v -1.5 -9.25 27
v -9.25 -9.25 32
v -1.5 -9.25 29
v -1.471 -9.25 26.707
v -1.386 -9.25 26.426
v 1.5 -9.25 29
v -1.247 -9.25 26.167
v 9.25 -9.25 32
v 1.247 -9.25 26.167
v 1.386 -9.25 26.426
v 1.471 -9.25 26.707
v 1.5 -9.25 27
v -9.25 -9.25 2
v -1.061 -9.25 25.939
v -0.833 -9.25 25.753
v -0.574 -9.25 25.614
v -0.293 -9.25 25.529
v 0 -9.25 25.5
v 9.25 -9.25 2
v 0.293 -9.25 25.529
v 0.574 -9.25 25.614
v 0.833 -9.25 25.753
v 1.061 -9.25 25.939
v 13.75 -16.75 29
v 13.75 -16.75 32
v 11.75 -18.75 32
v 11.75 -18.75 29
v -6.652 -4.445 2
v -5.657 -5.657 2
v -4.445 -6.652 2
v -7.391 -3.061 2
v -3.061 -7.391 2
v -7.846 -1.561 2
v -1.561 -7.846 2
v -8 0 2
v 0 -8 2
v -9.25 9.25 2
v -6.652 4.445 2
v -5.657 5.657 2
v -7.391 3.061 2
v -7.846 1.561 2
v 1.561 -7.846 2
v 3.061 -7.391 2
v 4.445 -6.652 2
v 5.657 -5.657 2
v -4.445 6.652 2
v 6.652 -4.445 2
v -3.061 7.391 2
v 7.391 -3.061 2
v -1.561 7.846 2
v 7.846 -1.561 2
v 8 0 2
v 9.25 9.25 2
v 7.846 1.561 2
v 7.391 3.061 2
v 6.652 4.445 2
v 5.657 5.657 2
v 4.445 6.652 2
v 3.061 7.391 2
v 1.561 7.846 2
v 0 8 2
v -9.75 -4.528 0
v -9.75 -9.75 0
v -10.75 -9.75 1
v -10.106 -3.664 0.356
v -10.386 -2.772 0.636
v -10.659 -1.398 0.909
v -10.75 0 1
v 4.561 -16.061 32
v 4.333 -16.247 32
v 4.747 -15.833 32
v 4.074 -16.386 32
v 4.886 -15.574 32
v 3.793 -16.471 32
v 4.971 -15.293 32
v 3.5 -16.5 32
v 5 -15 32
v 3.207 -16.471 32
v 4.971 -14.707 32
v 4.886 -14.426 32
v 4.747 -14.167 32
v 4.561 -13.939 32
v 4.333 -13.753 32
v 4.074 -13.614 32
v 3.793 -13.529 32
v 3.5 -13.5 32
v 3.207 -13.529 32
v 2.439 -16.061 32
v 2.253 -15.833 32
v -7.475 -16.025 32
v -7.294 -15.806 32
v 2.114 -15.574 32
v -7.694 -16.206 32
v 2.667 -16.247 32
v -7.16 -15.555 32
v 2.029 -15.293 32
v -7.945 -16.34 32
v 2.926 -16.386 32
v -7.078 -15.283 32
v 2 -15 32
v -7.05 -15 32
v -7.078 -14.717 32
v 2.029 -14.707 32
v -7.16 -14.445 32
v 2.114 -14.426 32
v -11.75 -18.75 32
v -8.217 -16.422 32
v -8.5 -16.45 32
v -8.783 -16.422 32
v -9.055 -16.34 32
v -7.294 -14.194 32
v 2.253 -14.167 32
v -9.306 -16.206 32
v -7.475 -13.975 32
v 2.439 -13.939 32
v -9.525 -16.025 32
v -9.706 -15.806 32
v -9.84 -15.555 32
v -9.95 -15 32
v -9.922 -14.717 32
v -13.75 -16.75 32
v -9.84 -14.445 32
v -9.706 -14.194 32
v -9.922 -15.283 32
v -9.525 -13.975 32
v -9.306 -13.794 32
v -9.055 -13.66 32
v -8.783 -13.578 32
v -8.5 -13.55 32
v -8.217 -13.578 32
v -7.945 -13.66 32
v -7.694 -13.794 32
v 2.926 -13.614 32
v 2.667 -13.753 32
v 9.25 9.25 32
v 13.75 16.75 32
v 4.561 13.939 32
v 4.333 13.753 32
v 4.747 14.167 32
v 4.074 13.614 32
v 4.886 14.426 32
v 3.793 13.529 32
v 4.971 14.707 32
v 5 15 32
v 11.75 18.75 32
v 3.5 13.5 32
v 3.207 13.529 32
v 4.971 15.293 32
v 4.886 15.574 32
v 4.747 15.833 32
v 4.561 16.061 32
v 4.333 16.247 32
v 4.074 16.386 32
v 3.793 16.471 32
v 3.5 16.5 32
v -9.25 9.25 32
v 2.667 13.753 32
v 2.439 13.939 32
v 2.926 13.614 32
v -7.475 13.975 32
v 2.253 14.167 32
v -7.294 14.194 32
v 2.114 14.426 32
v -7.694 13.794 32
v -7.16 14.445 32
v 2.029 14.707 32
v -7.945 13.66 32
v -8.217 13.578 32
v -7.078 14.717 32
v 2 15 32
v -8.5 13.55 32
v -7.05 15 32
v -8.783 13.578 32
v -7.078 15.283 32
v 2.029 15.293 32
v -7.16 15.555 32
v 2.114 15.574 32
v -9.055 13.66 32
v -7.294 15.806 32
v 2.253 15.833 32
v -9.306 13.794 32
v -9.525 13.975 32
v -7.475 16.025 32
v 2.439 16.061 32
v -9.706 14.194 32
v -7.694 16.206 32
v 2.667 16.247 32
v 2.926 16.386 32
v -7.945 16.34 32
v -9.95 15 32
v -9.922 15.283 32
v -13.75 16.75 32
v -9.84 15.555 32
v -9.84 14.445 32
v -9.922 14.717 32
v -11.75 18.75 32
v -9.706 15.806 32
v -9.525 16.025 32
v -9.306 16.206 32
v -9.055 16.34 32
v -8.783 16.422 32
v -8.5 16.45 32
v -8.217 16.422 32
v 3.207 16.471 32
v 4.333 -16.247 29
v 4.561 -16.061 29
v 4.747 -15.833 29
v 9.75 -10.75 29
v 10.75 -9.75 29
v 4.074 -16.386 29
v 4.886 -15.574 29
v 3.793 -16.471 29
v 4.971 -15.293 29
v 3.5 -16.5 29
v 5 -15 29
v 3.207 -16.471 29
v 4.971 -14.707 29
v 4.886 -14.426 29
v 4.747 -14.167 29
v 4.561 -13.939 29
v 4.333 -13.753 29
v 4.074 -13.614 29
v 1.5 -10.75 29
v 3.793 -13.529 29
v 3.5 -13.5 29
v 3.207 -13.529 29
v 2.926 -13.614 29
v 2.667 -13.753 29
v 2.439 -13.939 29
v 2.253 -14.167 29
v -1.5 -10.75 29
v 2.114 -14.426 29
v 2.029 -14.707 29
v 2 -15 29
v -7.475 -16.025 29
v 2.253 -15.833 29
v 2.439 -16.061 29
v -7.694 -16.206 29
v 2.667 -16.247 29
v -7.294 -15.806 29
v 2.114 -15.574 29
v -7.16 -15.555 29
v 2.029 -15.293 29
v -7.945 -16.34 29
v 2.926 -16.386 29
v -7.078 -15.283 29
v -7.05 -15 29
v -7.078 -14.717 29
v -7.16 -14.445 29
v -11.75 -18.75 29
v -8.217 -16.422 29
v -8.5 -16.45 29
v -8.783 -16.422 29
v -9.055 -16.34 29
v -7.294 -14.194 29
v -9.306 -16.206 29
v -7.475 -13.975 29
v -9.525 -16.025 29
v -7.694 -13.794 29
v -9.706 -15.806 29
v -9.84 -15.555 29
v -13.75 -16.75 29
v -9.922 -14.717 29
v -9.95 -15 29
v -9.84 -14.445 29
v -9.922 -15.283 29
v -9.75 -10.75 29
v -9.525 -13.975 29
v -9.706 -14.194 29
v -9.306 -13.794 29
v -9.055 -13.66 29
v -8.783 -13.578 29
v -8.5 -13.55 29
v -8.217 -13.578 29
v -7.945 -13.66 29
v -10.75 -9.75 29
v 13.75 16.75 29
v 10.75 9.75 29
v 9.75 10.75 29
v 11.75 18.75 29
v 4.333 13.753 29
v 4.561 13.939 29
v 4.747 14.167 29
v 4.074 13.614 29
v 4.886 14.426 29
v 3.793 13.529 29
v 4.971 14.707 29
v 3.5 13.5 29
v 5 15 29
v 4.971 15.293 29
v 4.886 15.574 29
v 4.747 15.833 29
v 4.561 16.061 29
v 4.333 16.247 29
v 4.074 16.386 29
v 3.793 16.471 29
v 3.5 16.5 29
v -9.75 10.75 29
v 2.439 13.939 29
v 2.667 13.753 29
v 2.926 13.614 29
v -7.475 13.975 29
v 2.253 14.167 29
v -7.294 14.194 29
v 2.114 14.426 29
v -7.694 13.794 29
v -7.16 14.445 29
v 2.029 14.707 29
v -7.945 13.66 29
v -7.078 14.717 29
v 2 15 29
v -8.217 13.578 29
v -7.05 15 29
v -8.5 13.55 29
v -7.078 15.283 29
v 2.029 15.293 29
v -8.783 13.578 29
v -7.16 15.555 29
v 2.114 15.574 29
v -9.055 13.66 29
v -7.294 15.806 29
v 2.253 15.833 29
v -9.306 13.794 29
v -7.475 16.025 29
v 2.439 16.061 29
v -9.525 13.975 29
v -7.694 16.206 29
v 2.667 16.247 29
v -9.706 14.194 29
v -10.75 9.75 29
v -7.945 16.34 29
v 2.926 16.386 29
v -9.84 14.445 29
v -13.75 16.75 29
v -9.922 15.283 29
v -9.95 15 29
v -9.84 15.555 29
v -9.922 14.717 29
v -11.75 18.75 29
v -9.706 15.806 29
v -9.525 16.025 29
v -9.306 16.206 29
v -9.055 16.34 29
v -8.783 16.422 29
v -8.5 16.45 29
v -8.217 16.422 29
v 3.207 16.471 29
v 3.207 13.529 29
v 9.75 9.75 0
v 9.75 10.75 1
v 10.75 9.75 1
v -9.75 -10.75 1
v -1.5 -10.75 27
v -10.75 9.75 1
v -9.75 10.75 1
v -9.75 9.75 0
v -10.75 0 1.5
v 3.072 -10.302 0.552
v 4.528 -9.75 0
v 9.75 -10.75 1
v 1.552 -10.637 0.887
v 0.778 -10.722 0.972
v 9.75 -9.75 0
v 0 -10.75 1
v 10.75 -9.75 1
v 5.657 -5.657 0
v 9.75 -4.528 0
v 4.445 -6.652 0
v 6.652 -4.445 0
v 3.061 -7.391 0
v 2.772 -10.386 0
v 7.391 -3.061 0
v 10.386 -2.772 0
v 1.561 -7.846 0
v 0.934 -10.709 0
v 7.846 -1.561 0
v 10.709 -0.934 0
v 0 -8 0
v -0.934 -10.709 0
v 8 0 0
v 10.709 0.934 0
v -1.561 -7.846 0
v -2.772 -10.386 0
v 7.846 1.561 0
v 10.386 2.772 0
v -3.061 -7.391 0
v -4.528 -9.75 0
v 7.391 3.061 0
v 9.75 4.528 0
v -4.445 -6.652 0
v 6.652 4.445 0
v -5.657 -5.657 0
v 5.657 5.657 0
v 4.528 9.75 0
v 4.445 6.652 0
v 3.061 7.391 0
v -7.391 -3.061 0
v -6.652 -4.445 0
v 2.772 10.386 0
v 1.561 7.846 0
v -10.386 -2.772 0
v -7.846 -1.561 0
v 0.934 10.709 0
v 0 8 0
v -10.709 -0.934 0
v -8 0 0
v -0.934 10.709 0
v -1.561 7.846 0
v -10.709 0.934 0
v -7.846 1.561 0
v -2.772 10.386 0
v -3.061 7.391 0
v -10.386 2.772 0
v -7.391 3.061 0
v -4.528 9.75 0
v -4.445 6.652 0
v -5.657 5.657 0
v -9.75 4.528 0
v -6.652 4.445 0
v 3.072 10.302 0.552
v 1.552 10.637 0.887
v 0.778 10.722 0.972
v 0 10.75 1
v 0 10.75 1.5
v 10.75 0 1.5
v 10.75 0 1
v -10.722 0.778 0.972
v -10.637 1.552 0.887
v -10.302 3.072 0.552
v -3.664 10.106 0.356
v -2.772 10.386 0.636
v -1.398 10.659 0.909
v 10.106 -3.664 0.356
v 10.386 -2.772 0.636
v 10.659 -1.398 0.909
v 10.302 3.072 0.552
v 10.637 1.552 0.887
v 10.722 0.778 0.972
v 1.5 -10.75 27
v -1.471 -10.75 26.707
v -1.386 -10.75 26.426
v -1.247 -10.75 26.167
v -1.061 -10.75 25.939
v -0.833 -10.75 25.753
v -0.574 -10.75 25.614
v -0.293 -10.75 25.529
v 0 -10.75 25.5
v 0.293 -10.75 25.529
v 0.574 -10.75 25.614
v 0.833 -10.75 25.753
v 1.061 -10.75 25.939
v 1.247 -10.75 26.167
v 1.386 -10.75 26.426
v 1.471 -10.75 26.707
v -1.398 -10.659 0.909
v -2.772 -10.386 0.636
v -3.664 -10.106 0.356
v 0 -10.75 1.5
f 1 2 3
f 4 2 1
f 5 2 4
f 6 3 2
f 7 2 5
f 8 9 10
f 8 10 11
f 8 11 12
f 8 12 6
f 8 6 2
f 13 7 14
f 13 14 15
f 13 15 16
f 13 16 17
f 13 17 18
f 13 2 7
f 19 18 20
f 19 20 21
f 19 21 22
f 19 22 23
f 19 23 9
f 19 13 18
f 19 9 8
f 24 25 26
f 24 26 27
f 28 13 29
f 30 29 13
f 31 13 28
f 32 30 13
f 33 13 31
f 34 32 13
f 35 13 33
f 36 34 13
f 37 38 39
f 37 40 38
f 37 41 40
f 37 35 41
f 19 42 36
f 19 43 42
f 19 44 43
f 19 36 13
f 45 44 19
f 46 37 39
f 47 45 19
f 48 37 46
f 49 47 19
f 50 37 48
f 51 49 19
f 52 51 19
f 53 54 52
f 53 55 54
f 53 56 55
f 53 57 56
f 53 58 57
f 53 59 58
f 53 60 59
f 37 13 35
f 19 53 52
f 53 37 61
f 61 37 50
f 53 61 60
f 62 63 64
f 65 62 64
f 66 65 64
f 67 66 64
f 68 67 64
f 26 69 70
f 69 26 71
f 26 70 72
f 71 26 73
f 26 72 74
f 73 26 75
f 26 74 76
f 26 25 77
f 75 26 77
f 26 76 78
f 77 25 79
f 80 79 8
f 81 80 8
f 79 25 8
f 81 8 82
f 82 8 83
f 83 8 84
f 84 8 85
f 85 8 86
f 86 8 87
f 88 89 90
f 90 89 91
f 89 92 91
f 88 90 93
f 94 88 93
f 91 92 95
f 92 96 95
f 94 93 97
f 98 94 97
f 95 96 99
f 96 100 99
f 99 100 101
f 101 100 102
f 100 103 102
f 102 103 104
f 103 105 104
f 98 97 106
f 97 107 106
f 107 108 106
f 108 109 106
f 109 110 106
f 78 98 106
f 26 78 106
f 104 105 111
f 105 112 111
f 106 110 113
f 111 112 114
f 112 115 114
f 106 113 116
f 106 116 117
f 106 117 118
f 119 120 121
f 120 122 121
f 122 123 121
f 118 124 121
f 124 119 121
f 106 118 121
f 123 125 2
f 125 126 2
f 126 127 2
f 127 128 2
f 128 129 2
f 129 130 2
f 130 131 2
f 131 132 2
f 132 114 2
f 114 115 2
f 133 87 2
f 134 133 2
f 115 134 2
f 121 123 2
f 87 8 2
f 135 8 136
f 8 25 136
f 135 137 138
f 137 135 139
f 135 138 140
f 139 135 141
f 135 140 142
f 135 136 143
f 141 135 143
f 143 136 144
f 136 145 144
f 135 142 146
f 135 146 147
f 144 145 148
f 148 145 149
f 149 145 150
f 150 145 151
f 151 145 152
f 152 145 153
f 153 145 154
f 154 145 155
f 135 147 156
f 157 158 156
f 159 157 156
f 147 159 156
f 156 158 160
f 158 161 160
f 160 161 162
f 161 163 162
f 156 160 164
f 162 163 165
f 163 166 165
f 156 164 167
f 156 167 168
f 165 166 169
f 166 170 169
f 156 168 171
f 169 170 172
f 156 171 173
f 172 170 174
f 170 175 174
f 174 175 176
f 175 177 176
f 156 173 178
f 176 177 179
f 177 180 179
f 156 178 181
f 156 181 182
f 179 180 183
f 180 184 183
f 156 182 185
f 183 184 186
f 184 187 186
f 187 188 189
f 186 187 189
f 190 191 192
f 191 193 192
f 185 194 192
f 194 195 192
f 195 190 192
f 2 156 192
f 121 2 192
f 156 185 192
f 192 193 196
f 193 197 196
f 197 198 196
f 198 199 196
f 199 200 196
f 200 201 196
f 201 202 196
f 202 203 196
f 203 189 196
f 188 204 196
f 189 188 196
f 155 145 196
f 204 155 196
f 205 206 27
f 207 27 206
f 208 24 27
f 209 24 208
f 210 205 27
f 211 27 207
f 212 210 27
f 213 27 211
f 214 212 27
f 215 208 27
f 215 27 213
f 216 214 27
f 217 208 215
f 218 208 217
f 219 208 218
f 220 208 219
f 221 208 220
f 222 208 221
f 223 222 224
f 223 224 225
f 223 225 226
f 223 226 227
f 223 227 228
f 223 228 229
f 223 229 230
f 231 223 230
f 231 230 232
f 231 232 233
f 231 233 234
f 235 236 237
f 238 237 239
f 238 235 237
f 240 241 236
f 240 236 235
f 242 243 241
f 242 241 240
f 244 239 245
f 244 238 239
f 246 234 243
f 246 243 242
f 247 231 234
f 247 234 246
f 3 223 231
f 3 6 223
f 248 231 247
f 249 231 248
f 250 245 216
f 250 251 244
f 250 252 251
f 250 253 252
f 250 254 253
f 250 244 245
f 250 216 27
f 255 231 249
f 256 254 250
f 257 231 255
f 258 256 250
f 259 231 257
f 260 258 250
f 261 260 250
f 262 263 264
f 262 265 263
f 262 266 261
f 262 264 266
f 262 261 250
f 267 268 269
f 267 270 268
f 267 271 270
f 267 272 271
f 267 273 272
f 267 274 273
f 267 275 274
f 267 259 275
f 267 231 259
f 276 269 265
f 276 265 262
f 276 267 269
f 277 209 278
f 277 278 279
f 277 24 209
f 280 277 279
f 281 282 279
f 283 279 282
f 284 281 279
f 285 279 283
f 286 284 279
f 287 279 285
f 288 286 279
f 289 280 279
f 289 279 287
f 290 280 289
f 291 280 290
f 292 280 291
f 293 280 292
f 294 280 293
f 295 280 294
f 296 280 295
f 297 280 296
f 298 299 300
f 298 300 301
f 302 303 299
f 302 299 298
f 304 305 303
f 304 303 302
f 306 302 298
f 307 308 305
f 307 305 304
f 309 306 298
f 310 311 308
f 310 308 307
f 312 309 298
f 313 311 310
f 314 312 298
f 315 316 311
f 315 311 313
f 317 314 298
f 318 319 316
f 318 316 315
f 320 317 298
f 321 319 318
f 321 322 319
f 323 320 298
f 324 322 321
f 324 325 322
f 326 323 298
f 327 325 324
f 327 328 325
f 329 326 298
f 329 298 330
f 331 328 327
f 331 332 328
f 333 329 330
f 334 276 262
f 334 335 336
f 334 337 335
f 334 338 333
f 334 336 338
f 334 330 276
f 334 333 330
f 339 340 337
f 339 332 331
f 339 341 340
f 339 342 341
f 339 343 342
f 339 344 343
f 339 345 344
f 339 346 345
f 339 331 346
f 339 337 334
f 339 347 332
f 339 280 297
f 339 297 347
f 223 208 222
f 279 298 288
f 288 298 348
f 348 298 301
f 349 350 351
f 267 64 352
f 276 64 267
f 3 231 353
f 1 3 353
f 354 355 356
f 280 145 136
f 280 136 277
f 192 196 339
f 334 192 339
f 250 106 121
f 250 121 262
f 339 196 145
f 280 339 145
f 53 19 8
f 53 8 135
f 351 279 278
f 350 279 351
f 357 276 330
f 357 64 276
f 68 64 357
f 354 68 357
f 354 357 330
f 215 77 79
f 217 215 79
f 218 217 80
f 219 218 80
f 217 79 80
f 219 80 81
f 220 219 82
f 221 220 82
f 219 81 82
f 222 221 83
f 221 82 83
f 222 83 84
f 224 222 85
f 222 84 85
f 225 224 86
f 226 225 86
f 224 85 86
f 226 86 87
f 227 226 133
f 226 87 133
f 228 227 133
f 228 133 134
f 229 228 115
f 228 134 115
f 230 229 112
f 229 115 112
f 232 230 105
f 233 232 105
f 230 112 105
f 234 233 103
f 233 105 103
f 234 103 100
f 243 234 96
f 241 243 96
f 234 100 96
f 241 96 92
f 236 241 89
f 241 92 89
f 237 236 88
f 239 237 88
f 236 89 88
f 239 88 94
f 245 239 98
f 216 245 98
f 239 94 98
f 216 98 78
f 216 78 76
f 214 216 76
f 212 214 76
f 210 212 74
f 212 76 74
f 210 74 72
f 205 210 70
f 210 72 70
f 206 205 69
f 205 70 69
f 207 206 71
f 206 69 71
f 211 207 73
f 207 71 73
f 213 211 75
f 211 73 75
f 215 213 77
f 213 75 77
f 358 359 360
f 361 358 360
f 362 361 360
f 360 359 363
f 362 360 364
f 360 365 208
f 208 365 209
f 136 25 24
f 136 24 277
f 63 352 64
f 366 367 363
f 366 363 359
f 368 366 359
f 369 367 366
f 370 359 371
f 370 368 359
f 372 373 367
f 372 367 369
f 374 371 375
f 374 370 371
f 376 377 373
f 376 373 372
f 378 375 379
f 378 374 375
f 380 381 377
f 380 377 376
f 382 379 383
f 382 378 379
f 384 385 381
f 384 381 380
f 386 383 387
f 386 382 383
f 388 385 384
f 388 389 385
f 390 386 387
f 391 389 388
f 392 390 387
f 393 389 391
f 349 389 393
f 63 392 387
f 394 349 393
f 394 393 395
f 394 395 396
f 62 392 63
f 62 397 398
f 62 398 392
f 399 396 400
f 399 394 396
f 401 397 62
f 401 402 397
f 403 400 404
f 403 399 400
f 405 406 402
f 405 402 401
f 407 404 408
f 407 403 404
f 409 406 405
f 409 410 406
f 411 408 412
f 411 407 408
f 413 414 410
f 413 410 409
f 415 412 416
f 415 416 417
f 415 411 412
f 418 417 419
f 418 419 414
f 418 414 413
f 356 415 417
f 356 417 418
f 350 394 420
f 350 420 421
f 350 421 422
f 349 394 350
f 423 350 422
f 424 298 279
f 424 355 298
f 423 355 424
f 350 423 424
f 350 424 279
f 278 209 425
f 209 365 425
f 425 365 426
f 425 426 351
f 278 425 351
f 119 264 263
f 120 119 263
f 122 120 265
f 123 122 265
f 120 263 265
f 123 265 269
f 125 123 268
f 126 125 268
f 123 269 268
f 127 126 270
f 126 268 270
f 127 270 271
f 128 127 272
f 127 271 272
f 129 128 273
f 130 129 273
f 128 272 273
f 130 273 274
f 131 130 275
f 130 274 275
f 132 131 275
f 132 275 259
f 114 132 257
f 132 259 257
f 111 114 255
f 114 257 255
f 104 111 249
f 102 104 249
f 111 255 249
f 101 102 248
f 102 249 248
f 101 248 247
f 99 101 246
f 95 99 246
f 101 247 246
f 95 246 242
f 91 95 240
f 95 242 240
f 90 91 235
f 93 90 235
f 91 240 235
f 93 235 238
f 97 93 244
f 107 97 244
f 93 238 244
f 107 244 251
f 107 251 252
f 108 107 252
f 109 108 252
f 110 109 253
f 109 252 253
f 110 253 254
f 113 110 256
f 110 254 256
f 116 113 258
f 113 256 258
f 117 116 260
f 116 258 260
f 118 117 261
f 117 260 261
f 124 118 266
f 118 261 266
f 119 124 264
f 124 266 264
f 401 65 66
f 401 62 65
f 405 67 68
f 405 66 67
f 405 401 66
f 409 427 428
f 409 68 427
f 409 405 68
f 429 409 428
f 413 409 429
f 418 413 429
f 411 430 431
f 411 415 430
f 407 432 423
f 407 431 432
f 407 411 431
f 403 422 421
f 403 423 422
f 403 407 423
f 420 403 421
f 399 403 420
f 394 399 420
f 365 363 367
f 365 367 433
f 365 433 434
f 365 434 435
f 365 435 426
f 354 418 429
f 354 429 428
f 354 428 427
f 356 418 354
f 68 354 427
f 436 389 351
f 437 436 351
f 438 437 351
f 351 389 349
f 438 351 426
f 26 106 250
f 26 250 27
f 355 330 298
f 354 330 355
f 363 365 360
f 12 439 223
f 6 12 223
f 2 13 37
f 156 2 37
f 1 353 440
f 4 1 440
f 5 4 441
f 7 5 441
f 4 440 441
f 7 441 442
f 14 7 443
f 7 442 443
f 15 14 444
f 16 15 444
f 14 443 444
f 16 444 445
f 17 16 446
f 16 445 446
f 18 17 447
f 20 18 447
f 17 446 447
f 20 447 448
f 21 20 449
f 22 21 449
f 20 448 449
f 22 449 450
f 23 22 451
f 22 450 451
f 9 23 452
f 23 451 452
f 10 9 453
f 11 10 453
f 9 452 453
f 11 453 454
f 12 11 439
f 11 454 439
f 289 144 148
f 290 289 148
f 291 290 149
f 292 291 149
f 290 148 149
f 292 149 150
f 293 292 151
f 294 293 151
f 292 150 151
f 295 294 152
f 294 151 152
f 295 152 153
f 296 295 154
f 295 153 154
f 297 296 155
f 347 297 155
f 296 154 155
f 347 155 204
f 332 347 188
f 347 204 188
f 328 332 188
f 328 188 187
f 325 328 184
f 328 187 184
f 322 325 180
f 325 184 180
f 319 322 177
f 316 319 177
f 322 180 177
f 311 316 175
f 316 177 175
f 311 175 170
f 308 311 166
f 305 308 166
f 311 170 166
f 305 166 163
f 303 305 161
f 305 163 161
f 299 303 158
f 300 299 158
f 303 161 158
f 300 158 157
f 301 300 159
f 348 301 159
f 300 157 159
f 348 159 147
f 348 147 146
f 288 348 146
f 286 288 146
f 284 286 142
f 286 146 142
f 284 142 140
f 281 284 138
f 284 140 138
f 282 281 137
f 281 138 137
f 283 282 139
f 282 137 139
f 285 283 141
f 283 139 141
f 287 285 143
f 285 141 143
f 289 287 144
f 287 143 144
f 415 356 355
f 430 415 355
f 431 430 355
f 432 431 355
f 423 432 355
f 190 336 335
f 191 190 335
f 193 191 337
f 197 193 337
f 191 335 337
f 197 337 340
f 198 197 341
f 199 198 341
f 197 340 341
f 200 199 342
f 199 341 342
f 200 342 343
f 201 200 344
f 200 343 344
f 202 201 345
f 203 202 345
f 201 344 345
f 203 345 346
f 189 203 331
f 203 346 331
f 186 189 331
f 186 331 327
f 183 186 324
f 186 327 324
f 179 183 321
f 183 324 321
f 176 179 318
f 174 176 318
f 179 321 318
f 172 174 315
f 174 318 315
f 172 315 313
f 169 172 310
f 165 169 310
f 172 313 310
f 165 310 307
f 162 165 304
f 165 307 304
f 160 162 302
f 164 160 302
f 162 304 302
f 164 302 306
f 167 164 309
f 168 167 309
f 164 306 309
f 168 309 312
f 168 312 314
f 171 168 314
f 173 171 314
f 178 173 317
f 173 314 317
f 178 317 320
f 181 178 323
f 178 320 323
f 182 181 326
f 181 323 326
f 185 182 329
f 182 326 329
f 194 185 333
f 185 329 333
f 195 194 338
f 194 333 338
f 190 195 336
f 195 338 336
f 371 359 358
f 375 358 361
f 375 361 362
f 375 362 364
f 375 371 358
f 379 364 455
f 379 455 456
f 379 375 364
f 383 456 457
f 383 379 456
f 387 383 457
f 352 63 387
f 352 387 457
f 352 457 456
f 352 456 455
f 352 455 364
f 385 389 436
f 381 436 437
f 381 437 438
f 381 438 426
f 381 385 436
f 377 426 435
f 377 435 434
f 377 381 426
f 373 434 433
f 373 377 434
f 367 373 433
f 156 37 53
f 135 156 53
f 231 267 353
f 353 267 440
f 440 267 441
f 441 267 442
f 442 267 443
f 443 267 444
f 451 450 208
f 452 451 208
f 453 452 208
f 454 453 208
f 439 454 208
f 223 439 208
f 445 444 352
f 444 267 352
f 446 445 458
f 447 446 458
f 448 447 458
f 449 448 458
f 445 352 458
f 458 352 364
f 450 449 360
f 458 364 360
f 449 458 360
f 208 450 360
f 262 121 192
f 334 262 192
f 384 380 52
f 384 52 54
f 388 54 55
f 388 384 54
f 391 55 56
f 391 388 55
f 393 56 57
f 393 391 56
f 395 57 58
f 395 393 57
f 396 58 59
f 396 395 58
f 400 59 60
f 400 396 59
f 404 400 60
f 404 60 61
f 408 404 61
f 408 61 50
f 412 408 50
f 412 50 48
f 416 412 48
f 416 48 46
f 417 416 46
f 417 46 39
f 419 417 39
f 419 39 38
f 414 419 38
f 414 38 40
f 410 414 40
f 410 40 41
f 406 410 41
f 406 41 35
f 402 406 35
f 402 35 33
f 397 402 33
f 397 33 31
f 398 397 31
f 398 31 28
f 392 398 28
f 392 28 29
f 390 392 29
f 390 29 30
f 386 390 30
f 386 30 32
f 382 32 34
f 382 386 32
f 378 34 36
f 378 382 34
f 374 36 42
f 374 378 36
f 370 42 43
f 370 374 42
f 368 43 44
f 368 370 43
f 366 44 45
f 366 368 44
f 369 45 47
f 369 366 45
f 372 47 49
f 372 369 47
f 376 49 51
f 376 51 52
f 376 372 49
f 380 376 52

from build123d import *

# Parameters (mm, degrees)
SKETCH1_W           = 21.5
SKETCH1_H           = 21.5
SKETCH1_R           = 8
BOSS_EXTRUDE1_DEPTH = 2
SKETCH2_W           = 21.5
SKETCH2_H           = 21.5
SKETCH2_W_2         = 18.5
SKETCH2_H_2         = 18.5
BOSS_EXTRUDE2_DEPTH = 30
SKETCH3_W           = 27.5
SKETCH3_H           = 37.5
SKETCH3_R           = 1.5
SKETCH3_W_2         = 21.5
SKETCH3_H_2         = 21.5
BOSS_EXTRUDE3_DEPTH = 3
CUT_EXTRUDE1_DEPTH  = 3
CHAMFER1_SIZE       = 1
CHAMFER2_SIZE       = 2
SKETCH5_R           = 1.5
SKETCH5_R_2         = 1.45
BOSS_EXTRUDE4_DEPTH = 3
SKETCH6_R           = 10.75
SKETCH6_R_2         = 8
BOSS_EXTRUDE5_DEPTH = 1.5


with BuildPart() as part:
    # Sketch1 → Boss-Extrude1 (new body)
    with BuildSketch(Plane.XY):
        Rectangle(SKETCH1_W, SKETCH1_H)
        Circle(SKETCH1_R, mode=Mode.SUBTRACT)
    extrude(amount=BOSS_EXTRUDE1_DEPTH)

    # Sketch2 → Boss-Extrude2 (add)
    with BuildSketch(Plane.XY.offset(2)):
        Rectangle(SKETCH2_W, SKETCH2_H)
        Rectangle(SKETCH2_W_2, SKETCH2_H_2, mode=Mode.SUBTRACT)
    extrude(amount=BOSS_EXTRUDE2_DEPTH)

    # Sketch3 → Boss-Extrude3 (add)
    with BuildSketch(Plane.XY.offset(32)):
        Rectangle(SKETCH3_W, SKETCH3_H)
        with Locations((3.5, -15)):
            Circle(SKETCH3_R, mode=Mode.SUBTRACT)
        with Locations((3.5, 15)):
            Circle(SKETCH3_R, mode=Mode.SUBTRACT)
        with Locations((-8.5, 15)):
            Circle(SKETCH3_R, mode=Mode.SUBTRACT)
        with Locations((-8.5, -15)):
            Circle(SKETCH3_R, mode=Mode.SUBTRACT)
        Rectangle(SKETCH3_W_2, SKETCH3_H_2, mode=Mode.SUBTRACT)
    extrude(amount=-BOSS_EXTRUDE3_DEPTH)

    # Sketch4 → Cut-Extrude1 (cut)
    with BuildSketch(Plane.XZ.offset(10.75)):
        with BuildLine():
            Line((-1.5, 29), (-1.5, 27))
            ThreePointArc((-1.5, 27), (0, 25.5), (1.5, 27))
            Line((1.5, 27), (1.5, 29))
            Line((1.5, 29), (-1.5, 29))
        make_face()
    extrude(amount=-CUT_EXTRUDE1_DEPTH, mode=Mode.SUBTRACT)

    # Chamfer1
    chamfer1_edges = [part.edges().sort_by_distance(p)[0] for p in [
        (-10.75, 10.75, 14.5),
        (10.75, 10.75, 14.5),
        (10.75, -10.75, 14.5),
        (-10.75, -10.75, 14.5),
        (0, 10.75, 0),
        (10.75, 0, 0),
        (0, -10.75, 0),
        (-10.75, 0, 0),
    ]]
    chamfer(chamfer1_edges, length=CHAMFER1_SIZE)

    # Chamfer2
    chamfer2_edges = [part.edges().sort_by_distance(p)[0] for p in [
        (13.75, 18.75, 30.5),
        (13.75, -18.75, 30.5),
        (-13.75, -18.75, 30.5),
        (-13.75, 18.75, 30.5),
    ]]
    chamfer(chamfer2_edges, length=CHAMFER2_SIZE)

    # Sketch5 → Boss-Extrude4 (add)
    with BuildSketch(Plane(origin=(0, 0, 29), x_dir=(-1, 0, 0), z_dir=(0, 0, -1))):
        with Locations((8.5, -15)):
            Circle(SKETCH5_R)
        with Locations((8.5, -15)):
            Circle(SKETCH5_R_2, mode=Mode.SUBTRACT)
        with Locations((8.5, 15)):
            Circle(SKETCH5_R)
        with Locations((8.5, 15)):
            Circle(SKETCH5_R_2, mode=Mode.SUBTRACT)
    extrude(amount=-BOSS_EXTRUDE4_DEPTH)

    # Sketch6 → Boss-Extrude5 (add)
    with BuildSketch(Plane(origin=(0, 0, 0), x_dir=(-1, 0, 0), z_dir=(0, 0, -1))):
        Circle(SKETCH6_R)
        Circle(SKETCH6_R_2, mode=Mode.SUBTRACT)
    extrude(amount=-BOSS_EXTRUDE5_DEPTH)


solid = part.part
